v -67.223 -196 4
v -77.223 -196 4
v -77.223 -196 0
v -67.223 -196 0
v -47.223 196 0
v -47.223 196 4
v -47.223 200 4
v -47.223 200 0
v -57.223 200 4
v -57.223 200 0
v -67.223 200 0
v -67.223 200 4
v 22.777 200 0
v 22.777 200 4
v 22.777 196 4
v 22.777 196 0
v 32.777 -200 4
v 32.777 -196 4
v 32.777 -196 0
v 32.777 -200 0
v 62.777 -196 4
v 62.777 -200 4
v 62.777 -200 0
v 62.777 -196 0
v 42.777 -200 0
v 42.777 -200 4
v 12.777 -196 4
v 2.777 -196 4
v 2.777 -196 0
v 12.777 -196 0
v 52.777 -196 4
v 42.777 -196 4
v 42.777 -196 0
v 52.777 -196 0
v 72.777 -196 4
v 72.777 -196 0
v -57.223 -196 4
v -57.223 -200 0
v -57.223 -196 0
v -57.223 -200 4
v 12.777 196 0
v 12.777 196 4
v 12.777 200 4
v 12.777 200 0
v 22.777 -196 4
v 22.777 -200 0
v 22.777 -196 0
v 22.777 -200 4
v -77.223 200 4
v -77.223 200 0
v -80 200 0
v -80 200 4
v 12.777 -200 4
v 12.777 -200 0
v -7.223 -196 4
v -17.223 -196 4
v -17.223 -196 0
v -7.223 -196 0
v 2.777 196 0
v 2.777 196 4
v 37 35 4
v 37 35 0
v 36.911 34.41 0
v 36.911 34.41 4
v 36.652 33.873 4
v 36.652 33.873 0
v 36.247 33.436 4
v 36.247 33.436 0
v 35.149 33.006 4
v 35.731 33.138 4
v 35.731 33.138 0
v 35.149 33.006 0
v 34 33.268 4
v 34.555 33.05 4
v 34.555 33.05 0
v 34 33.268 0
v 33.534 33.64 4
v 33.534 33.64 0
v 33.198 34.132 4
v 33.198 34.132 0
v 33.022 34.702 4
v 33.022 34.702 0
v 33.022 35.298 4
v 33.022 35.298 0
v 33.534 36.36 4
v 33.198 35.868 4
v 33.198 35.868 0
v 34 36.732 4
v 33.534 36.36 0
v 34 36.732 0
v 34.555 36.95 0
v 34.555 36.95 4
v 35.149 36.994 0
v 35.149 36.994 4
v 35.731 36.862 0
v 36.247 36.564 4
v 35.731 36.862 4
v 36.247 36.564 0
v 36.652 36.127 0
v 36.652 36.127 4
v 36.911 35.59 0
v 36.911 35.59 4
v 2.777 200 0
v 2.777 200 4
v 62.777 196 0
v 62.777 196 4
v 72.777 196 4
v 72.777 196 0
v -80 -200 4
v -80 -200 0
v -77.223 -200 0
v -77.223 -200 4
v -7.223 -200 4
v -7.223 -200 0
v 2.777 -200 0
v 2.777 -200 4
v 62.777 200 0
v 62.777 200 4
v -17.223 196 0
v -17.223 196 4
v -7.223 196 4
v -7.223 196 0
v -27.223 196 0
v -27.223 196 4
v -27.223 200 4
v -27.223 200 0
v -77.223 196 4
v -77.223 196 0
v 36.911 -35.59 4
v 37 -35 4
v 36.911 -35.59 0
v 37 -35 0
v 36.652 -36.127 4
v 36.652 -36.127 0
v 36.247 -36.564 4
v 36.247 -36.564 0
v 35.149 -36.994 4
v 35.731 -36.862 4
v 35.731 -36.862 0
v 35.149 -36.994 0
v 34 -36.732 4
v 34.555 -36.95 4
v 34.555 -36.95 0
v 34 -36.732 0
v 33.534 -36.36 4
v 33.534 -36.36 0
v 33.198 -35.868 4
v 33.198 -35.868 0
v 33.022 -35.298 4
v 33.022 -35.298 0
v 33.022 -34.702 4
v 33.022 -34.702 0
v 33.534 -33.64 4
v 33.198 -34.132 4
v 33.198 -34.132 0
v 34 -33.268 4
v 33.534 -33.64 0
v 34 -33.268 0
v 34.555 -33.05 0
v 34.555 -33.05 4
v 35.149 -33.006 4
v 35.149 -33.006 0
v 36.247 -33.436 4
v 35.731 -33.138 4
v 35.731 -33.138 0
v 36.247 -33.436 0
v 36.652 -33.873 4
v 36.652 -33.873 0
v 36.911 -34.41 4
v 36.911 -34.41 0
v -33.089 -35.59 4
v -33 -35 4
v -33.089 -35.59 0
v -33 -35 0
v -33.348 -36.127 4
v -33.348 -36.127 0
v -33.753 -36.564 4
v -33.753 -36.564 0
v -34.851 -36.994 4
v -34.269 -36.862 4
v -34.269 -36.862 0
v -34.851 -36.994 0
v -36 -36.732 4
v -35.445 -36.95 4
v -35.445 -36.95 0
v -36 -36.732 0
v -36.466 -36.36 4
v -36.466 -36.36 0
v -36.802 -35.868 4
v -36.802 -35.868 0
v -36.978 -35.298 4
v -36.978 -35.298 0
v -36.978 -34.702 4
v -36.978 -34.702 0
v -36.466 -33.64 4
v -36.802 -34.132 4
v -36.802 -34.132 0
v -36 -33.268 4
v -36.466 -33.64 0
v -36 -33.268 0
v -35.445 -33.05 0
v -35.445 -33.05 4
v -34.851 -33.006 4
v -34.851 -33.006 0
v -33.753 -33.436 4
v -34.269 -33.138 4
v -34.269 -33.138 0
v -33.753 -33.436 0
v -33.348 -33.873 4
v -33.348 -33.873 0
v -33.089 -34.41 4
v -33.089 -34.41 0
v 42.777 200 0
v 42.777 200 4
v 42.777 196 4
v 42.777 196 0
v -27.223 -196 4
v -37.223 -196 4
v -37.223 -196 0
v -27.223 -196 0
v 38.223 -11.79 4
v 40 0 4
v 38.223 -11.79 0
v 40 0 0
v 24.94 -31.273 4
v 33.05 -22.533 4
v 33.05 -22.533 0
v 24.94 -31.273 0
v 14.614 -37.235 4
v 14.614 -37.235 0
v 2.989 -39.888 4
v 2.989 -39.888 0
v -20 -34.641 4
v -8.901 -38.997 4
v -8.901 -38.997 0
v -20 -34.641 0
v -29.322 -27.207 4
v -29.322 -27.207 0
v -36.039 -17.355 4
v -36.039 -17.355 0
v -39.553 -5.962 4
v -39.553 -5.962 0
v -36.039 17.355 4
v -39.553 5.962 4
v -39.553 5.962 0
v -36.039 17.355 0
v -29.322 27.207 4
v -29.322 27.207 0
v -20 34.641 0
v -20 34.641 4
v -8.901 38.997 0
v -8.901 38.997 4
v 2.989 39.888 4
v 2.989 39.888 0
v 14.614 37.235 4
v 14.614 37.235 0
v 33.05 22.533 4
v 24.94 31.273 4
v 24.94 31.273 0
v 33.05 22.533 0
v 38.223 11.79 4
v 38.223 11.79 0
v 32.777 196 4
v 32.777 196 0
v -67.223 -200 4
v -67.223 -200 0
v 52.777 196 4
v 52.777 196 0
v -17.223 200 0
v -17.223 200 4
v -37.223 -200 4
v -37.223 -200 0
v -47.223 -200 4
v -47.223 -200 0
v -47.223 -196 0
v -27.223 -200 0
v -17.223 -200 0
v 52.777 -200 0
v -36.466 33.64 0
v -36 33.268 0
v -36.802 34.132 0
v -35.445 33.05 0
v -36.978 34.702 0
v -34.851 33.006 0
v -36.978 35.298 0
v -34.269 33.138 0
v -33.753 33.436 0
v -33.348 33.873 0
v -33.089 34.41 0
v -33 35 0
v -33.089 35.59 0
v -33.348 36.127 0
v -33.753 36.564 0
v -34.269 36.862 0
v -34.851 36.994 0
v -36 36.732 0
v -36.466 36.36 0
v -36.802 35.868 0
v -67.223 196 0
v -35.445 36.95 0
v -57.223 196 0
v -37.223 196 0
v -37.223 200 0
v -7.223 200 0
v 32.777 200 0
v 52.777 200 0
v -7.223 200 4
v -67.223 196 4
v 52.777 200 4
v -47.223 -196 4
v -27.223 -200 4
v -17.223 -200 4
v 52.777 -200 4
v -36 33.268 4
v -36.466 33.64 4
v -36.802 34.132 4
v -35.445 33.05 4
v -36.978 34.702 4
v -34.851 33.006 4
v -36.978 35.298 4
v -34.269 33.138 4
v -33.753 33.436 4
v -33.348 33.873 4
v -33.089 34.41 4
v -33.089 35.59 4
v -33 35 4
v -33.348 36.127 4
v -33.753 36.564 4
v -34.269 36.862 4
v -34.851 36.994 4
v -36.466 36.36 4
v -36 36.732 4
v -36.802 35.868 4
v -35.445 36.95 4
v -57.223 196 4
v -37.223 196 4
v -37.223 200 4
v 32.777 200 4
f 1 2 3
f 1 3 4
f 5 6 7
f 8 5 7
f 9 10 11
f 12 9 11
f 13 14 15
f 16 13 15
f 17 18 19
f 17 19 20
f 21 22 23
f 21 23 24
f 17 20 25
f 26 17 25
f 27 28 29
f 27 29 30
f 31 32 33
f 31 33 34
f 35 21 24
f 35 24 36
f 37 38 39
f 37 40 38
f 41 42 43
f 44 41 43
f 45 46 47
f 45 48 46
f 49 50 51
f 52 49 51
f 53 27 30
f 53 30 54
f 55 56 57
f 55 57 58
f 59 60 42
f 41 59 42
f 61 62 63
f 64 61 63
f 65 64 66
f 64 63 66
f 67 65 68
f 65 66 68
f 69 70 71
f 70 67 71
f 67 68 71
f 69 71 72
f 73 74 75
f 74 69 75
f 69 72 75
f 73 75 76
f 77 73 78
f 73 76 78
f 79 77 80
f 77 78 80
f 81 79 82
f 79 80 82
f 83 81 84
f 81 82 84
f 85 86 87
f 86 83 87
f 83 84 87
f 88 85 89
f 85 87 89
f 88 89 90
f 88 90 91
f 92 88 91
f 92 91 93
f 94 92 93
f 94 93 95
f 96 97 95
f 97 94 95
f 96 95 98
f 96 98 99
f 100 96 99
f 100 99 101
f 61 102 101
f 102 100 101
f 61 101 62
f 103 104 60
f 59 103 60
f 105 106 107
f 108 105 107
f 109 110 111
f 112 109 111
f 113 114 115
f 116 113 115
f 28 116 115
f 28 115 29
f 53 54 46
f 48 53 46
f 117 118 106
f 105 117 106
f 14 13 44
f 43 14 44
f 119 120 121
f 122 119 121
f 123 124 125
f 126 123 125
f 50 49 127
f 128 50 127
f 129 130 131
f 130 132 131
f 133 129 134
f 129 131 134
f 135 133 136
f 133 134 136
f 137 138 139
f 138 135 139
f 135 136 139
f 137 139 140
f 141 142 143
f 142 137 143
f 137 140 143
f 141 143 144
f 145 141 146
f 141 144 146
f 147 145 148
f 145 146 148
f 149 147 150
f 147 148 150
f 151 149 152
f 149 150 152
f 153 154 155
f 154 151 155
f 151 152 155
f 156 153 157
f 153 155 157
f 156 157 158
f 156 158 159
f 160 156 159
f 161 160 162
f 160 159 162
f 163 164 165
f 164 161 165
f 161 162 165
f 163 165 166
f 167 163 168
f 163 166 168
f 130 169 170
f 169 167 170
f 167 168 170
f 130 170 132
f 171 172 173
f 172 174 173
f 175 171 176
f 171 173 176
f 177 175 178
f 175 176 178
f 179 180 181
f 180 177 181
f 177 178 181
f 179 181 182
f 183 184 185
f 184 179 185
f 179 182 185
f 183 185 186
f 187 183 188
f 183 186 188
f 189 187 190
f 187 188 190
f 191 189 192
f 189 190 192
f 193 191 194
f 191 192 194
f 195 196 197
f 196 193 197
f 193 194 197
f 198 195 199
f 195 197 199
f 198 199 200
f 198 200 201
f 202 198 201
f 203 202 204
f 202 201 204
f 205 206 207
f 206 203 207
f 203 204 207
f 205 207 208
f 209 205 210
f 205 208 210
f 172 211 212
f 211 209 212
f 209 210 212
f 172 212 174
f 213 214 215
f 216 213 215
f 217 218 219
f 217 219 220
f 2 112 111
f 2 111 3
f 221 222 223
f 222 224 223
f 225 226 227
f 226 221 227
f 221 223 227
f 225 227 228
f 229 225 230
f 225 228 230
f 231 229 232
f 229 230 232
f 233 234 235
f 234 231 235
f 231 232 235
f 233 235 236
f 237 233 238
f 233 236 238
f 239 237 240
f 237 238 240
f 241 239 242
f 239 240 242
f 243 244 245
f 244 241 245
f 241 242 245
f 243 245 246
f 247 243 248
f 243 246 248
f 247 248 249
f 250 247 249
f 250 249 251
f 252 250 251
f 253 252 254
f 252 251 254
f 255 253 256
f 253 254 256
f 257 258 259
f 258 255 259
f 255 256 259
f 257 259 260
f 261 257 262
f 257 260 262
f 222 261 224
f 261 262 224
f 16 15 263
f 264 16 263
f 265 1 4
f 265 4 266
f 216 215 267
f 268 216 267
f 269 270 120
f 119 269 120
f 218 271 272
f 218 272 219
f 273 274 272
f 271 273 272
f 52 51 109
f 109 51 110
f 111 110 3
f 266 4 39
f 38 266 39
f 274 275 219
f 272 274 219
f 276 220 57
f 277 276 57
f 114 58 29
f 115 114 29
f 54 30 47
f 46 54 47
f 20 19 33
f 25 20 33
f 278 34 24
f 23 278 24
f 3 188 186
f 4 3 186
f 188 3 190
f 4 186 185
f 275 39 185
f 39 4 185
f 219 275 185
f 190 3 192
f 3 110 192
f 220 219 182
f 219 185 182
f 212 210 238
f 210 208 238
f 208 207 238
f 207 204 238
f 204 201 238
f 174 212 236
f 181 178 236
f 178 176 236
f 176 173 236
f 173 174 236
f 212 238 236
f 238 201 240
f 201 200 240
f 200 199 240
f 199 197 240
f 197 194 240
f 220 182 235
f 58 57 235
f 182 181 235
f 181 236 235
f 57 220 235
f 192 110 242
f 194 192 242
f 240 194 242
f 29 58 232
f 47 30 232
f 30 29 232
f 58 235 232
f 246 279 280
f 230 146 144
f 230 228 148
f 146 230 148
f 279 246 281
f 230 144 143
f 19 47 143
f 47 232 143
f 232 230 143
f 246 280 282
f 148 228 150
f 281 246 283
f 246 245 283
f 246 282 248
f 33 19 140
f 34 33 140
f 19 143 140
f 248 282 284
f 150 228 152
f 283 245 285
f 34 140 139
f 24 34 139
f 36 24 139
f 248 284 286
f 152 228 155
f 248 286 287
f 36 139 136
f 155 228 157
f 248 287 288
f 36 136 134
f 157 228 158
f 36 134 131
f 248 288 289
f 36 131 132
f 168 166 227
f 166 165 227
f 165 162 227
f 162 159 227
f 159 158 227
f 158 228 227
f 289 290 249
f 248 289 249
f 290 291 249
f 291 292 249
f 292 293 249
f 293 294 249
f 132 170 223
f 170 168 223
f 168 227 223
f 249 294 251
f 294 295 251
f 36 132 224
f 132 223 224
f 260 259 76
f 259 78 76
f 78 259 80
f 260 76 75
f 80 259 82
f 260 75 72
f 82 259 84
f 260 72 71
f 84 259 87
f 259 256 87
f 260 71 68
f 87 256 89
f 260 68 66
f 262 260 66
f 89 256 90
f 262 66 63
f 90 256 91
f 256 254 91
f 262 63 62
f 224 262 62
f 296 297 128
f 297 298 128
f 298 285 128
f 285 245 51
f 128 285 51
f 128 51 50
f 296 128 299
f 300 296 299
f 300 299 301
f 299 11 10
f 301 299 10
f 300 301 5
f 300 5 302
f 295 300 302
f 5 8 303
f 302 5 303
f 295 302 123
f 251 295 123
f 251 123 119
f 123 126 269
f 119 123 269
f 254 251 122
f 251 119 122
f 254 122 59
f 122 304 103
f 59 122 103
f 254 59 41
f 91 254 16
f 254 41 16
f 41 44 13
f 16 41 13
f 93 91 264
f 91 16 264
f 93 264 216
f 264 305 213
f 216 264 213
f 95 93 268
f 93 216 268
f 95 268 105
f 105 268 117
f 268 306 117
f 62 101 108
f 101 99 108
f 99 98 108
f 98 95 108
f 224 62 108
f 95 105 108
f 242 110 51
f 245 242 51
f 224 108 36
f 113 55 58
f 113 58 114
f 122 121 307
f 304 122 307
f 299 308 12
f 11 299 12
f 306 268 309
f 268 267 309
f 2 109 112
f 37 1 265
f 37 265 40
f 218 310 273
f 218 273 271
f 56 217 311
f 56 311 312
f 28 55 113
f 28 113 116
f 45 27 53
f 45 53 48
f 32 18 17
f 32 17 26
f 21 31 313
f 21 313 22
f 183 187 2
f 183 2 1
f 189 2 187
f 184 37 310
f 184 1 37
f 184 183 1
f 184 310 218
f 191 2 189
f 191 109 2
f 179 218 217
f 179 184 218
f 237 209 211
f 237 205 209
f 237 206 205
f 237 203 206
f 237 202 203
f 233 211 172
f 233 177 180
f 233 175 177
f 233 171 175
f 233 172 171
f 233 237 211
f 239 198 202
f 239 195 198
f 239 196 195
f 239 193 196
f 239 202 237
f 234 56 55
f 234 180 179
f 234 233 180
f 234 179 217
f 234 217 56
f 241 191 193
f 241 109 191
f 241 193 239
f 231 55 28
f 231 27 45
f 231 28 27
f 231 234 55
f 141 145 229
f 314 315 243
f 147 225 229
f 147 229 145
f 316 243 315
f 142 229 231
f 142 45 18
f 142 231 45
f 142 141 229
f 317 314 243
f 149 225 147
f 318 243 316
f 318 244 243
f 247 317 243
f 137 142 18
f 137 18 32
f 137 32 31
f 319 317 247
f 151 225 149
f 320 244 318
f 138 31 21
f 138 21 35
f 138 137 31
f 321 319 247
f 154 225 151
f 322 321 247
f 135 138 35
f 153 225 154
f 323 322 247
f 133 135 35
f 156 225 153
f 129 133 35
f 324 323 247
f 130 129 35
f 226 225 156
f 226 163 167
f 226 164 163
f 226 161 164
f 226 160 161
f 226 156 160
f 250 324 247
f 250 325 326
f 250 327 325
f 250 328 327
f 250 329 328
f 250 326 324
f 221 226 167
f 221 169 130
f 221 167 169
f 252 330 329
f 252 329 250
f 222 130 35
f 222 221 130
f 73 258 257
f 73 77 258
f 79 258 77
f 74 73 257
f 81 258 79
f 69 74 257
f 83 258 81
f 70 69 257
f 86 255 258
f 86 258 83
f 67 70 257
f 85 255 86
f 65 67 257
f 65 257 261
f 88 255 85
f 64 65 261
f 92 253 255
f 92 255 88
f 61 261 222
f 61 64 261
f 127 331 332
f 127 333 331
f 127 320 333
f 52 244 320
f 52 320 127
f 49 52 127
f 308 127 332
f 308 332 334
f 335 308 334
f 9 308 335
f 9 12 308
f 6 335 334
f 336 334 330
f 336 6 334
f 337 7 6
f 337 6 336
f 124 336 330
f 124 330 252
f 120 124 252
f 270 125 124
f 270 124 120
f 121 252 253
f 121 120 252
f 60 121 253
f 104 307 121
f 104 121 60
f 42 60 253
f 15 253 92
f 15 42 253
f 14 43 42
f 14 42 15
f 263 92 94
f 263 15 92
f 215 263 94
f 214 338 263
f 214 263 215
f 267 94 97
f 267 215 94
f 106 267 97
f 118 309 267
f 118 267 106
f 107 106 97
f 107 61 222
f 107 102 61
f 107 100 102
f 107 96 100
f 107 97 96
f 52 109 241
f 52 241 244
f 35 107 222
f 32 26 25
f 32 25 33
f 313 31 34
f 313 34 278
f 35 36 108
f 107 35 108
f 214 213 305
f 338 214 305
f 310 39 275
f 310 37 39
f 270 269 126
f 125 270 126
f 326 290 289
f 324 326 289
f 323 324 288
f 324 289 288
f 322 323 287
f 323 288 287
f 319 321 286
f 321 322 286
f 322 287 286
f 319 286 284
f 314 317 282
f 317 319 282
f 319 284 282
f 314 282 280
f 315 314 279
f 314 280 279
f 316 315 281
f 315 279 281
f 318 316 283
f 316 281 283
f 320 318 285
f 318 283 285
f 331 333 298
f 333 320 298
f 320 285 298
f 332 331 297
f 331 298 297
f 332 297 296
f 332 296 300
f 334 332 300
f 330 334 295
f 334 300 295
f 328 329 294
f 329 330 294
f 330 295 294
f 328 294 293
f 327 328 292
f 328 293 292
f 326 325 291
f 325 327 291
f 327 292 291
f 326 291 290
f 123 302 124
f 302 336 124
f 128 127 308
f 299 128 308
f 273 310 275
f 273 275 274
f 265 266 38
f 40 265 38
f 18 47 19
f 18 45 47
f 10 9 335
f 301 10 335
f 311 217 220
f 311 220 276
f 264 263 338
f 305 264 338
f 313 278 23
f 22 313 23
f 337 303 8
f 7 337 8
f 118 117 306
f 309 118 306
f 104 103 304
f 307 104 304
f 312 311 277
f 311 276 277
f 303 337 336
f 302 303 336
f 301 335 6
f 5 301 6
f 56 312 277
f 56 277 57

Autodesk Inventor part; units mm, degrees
ref_plane "YZ Plane" through (0, 0, 0) normal (1, 0, 0) x (0, 1, 0)
ref_plane "XZ Plane" through (0, 0, 0) normal (0, 1, 0) x (-1, 0, 0)
ref_plane "XY Plane" through (0, 0, 0) normal (0, 0, 1) x (1, 0, 0)
sketch "Эскиз1" plane through (0, 0, 0) normal (0, 0, 1) x (1, 0, 0)
  circle A0 centre (0, 0) radius 40 projected
  circle A1 centre (35, 35) radius 2 projected
  circle A2 centre (-35, 35) radius 2 projected
  circle A3 centre (-35, -35) radius 2 projected
  circle A4 centre (35, -35) radius 2 projected
  line L0 (72.777, 200) -> (-80, 200)
  line L1 (-80, 200) -> (-80, -200)
  line L2 (-80, -200) -> (72.777, -200)
  line L3 (72.777, -200) -> (72.777, 200)
  point P0 (0, 0)
  dimension "d0" = 400
  dimension "d1" = 200
  dimension "d2" = 80
extrude "Выдавливание1" add sketch "Эскиз1" along normal blind 4
sketch "Эскиз3" plane through (0, 0, 4) normal (0, 0, 1) x (1, 0, 0)
  line L0 (72.777, 200) -> (62.777, 200)
  line L1 (62.777, 200) -> (62.777, 196)
  line L2 (62.777, 196) -> (72.777, 196)
  line L3 (72.777, 196) -> (72.777, 200)
  line L4 (72.777, 200) -> (-80, 200) projected
  line L5 (52.777, 200) -> (42.777, 200)
  line L6 (42.777, 200) -> (42.777, 196)
  line L7 (42.777, 196) -> (52.777, 196)
  line L8 (52.777, 196) -> (52.777, 200)
  line L9 (32.777, 200) -> (22.777, 200)
  line L10 (22.777, 200) -> (22.777, 196)
  line L11 (22.777, 196) -> (32.777, 196)
  line L12 (32.777, 196) -> (32.777, 200)
  line L13 (12.777, 200) -> (2.777, 200)
  line L14 (2.777, 200) -> (2.777, 196)
  line L15 (2.777, 196) -> (12.777, 196)
  line L16 (12.777, 196) -> (12.777, 200)
  line L17 (-7.223, 200) -> (-17.223, 200)
  line L18 (-17.223, 200) -> (-17.223, 196)
  line L19 (-17.223, 196) -> (-7.223, 196)
  line L20 (-7.223, 196) -> (-7.223, 200)
  line L21 (-27.223, 200) -> (-37.223, 200)
  line L22 (-37.223, 200) -> (-37.223, 196)
  line L23 (-37.223, 196) -> (-27.223, 196)
  line L24 (-27.223, 196) -> (-27.223, 200)
  line L25 (-47.223, 200) -> (-57.223, 200)
  line L26 (-57.223, 200) -> (-57.223, 196)
  line L27 (-57.223, 196) -> (-47.223, 196)
  line L28 (-47.223, 196) -> (-47.223, 200)
  line L29 (-67.223, 200) -> (-77.223, 200)
  line L30 (-77.223, 200) -> (-77.223, 196)
  line L31 (-77.223, 196) -> (-67.223, 196)
  line L32 (-67.223, 196) -> (-67.223, 200)
  line L33 (0, 0) -> (123.2904, 0) construction
  line L34 (72.777, -200) -> (62.777, -200)
  line L35 (62.777, -200) -> (62.777, -196)
  line L36 (62.777, -196) -> (72.777, -196)
  line L37 (72.777, -196) -> (72.777, -200)
  line L38 (72.777, -200) -> (-80, -200)
  line L39 (52.777, -200) -> (42.777, -200)
  line L40 (42.777, -200) -> (42.777, -196)
  line L41 (42.777, -196) -> (52.777, -196)
  line L42 (52.777, -196) -> (52.777, -200)
  line L43 (32.777, -200) -> (22.777, -200)
  line L44 (22.777, -200) -> (22.777, -196)
  line L45 (22.777, -196) -> (32.777, -196)
  line L46 (32.777, -196) -> (32.777, -200)
  line L47 (12.777, -200) -> (2.777, -200)
  line L48 (2.777, -200) -> (2.777, -196)
  line L49 (2.777, -196) -> (12.777, -196)
  line L50 (12.777, -196) -> (12.777, -200)
  line L51 (-7.223, -200) -> (-17.223, -200)
  line L52 (-17.223, -200) -> (-17.223, -196)
  line L53 (-17.223, -196) -> (-7.223, -196)
  line L54 (-7.223, -196) -> (-7.223, -200)
  line L55 (-27.223, -200) -> (-37.223, -200)
  line L56 (-37.223, -200) -> (-37.223, -196)
  line L57 (-37.223, -196) -> (-27.223, -196)
  line L58 (-27.223, -196) -> (-27.223, -200)
  line L59 (-47.223, -200) -> (-57.223, -200)
  line L60 (-57.223, -200) -> (-57.223, -196)
  line L61 (-57.223, -196) -> (-47.223, -196)
  line L62 (-47.223, -196) -> (-47.223, -200)
  line L63 (-67.223, -200) -> (-77.223, -200)
  line L64 (-77.223, -200) -> (-77.223, -196)
  line L65 (-77.223, -196) -> (-67.223, -196)
  line L66 (-67.223, -196) -> (-67.223, -200)
  point P0 (-87.223, 200)
  point P1 (-87.223, -200)
  dimension "d7" = 10
  dimension "d8" = 4
  dimension "d11" = 20
extrude "Выдавливание2" cut sketch "Эскиз3" against normal blind 4
equation "\"d1\" = 0.5 * d0"
properties part number "задняя стенка"
